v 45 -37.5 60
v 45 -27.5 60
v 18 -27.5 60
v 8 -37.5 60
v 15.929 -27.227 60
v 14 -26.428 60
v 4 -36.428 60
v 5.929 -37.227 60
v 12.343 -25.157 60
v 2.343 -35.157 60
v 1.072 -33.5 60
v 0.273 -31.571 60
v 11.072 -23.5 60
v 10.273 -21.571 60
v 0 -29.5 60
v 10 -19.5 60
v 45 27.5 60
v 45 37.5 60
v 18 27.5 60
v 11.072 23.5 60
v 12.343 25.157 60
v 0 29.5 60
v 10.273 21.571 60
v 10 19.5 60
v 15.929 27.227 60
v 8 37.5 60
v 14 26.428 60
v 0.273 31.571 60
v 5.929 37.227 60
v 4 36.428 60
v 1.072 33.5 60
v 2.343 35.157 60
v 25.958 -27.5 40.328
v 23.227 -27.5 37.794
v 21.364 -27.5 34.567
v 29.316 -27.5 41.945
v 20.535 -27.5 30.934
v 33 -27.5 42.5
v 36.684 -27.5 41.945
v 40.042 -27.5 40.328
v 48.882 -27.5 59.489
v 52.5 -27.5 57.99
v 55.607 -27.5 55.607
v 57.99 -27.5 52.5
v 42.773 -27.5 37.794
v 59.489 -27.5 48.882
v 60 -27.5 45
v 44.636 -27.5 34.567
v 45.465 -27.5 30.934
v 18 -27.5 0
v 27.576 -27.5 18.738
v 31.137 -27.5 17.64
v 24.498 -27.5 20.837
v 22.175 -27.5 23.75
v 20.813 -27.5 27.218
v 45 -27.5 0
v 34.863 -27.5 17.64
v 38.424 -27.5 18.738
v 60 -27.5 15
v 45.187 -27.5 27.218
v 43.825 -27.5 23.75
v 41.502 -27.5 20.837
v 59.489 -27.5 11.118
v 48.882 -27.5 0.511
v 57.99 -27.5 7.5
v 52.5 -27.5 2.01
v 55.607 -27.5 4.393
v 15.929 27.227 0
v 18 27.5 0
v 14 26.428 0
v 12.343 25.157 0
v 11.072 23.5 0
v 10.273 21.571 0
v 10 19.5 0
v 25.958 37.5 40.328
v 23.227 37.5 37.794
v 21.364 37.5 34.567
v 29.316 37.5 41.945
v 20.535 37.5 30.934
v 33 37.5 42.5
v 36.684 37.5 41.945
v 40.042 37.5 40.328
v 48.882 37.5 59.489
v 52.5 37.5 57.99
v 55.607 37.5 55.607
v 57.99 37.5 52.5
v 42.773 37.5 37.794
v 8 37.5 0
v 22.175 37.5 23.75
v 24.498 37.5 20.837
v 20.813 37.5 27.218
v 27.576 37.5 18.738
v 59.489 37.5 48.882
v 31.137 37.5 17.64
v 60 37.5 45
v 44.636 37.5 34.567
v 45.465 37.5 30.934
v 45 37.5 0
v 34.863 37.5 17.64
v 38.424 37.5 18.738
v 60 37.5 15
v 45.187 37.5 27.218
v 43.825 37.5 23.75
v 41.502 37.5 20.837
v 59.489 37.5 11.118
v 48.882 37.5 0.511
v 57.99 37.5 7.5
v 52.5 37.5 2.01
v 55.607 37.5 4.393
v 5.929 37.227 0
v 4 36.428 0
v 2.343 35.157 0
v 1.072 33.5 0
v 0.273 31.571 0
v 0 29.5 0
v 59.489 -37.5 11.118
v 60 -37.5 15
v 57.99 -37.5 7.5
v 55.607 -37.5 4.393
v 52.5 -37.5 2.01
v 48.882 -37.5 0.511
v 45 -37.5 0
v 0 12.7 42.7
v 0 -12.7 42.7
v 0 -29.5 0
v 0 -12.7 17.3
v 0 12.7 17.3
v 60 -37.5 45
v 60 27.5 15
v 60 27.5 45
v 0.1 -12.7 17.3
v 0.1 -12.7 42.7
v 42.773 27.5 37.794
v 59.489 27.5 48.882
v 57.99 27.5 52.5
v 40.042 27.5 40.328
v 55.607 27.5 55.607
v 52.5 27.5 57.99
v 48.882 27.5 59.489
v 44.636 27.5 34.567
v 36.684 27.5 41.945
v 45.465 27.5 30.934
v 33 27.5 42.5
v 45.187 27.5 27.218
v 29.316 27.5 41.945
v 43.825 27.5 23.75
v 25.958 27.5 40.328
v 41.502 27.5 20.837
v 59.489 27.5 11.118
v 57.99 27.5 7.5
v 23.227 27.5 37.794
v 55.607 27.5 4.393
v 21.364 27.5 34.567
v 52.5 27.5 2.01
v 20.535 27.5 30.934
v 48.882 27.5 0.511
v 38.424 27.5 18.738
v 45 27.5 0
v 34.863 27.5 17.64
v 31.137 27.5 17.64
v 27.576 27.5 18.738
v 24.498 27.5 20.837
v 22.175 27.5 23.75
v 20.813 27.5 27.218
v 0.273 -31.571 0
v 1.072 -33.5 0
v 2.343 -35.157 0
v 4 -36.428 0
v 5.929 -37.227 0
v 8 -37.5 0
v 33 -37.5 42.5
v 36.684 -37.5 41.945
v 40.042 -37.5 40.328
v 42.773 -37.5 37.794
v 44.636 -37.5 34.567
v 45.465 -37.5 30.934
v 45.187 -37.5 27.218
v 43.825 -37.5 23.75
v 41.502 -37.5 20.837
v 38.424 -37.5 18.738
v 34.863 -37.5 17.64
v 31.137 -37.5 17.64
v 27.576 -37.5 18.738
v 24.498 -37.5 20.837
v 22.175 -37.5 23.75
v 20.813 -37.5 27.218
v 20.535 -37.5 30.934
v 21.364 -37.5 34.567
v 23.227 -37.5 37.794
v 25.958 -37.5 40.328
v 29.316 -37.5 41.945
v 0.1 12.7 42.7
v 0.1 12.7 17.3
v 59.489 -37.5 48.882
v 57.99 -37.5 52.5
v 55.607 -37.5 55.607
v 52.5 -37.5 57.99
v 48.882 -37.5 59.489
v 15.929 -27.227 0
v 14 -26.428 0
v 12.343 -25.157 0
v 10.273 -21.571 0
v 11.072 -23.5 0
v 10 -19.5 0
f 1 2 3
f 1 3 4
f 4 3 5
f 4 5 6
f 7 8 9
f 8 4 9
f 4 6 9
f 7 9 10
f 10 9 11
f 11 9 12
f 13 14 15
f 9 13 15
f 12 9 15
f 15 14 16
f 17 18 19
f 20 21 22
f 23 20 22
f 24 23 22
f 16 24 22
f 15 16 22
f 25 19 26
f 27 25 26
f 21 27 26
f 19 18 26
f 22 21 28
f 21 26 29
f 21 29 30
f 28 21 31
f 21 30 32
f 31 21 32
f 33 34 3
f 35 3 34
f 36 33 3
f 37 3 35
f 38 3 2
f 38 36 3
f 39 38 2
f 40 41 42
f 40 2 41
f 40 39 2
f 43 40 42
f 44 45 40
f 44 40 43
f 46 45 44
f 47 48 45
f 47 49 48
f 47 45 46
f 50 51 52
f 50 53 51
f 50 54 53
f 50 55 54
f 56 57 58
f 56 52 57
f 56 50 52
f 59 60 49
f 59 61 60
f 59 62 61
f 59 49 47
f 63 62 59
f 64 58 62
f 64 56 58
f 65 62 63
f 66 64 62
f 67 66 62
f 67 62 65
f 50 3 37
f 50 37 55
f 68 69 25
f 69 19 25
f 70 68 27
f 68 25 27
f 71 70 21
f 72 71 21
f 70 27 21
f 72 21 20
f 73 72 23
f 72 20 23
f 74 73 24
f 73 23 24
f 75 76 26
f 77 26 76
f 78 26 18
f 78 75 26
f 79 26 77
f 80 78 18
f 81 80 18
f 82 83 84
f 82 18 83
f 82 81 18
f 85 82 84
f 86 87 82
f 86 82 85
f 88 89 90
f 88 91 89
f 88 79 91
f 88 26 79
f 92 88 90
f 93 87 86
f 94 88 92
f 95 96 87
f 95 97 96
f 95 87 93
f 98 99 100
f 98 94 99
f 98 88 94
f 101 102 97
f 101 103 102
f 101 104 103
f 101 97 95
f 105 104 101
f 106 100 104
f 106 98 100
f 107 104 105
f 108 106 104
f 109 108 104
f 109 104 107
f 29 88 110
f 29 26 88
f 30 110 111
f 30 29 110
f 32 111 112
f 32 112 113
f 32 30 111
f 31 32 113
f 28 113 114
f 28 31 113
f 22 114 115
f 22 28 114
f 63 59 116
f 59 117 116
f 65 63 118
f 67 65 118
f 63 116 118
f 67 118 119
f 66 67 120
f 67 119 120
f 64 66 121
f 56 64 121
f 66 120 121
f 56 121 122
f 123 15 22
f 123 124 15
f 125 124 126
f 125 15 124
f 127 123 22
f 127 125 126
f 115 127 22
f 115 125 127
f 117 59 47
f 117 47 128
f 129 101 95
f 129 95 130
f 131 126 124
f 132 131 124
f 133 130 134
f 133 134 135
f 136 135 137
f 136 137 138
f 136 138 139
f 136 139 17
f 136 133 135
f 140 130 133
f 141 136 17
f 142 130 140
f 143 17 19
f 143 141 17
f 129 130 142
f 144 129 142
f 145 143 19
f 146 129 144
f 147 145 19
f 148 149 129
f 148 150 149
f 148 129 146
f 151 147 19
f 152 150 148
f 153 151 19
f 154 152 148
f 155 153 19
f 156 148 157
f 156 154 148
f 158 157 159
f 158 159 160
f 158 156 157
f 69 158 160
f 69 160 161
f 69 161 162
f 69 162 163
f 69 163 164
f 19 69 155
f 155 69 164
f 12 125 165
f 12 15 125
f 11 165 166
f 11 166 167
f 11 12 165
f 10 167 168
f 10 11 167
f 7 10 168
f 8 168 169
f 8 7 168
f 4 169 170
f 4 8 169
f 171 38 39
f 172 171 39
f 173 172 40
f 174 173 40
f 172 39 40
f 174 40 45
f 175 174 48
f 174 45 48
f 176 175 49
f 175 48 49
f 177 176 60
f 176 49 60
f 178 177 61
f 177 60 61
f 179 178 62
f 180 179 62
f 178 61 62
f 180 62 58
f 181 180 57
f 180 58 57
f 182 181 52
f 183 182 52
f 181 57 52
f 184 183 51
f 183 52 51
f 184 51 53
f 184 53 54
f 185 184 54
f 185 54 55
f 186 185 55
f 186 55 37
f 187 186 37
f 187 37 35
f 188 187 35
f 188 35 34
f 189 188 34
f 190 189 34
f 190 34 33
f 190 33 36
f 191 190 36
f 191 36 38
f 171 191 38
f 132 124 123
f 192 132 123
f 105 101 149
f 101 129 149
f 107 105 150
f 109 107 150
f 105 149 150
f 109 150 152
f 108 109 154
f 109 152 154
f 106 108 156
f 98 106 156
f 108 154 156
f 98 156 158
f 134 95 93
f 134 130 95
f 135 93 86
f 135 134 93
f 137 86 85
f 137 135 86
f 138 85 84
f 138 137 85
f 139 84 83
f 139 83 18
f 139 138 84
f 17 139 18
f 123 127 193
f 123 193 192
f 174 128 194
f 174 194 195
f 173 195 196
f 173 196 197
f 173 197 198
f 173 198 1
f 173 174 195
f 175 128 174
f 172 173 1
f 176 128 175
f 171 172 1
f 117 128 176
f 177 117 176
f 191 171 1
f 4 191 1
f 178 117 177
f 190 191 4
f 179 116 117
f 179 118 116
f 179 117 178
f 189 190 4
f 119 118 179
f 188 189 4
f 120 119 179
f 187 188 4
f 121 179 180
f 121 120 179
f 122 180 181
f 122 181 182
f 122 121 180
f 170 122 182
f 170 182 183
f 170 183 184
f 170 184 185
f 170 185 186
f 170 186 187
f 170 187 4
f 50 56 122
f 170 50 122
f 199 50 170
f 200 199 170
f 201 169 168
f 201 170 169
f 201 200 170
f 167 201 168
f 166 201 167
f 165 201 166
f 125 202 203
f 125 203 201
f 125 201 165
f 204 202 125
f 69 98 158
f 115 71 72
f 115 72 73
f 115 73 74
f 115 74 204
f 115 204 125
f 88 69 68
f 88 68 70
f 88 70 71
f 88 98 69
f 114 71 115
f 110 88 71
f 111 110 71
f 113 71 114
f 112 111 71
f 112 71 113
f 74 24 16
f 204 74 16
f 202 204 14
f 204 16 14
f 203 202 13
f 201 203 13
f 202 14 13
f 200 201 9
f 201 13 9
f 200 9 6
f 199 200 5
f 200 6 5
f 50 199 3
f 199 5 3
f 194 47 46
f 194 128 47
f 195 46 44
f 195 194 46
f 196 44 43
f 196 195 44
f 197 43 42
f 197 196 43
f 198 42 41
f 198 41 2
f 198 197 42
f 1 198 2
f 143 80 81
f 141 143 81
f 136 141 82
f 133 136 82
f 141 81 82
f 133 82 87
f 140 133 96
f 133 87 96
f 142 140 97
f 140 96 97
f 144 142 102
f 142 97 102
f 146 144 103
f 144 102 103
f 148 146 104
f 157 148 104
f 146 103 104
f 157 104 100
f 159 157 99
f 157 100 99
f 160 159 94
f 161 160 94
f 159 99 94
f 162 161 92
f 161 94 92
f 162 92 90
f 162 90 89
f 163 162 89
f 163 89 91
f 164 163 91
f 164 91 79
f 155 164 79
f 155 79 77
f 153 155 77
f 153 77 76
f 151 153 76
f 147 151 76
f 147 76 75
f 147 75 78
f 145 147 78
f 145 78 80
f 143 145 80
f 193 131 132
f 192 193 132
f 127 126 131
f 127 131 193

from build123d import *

# Parameters (mm, degrees)
BOSS_EXTRUDE1_DEPTH = 60
FILLET1_R           = 15
FILLET2_R           = 8
SKETCH2_R           = 12.5
CUT_EXTRUDE1_DEPTH  = 100
SKETCH4_W           = 25.4
SKETCH4_H           = 25.4
CUT_EXTRUDE2_DEPTH  = 0.1


with BuildPart() as part:
    # Sketch1 → Boss-Extrude1 (new body)
    with BuildSketch(Plane.XY):
        Polygon((0, -37.5), (0, 37.5), (60, 37.5), (60, 27.5), (10, 27.5), (10, -27.5), (60, -27.5), (60, -37.5), align=None)
    extrude(amount=BOSS_EXTRUDE1_DEPTH)

    # Fillet1
    fillet1_edges = [part.edges().sort_by_distance(p)[0] for p in [
        (60, -32.5, 0),
        (60, -32.5, 60),
        (60, 32.5, 60),
        (60, 32.5, 0),
    ]]
    fillet(fillet1_edges, radius=FILLET1_R)

    # Fillet2
    fillet2_edges = [part.edges().sort_by_distance(p)[0] for p in [
        (10, 27.5, 30),
        (10, -27.5, 30),
        (0, -37.5, 30),
        (0, 37.5, 30),
    ]]
    fillet(fillet2_edges, radius=FILLET2_R)

    # Sketch2 → Cut-Extrude1 (cut)
    with BuildSketch(Plane(origin=(0, 37.5, 0), x_dir=(1, 0, 0), z_dir=(0, 1, 0))):
        with Locations(Location((33, -30, 0), (0, 0, 270))):
            Circle(SKETCH2_R)
    extrude(amount=-CUT_EXTRUDE1_DEPTH, mode=Mode.SUBTRACT)

    # Sketch4 → Cut-Extrude2 (cut)
    with BuildSketch(Plane.ZY):
        with Locations((30, 0)):
            Rectangle(SKETCH4_W, SKETCH4_H)
    extrude(amount=-CUT_EXTRUDE2_DEPTH, mode=Mode.SUBTRACT)


solid = part.part
